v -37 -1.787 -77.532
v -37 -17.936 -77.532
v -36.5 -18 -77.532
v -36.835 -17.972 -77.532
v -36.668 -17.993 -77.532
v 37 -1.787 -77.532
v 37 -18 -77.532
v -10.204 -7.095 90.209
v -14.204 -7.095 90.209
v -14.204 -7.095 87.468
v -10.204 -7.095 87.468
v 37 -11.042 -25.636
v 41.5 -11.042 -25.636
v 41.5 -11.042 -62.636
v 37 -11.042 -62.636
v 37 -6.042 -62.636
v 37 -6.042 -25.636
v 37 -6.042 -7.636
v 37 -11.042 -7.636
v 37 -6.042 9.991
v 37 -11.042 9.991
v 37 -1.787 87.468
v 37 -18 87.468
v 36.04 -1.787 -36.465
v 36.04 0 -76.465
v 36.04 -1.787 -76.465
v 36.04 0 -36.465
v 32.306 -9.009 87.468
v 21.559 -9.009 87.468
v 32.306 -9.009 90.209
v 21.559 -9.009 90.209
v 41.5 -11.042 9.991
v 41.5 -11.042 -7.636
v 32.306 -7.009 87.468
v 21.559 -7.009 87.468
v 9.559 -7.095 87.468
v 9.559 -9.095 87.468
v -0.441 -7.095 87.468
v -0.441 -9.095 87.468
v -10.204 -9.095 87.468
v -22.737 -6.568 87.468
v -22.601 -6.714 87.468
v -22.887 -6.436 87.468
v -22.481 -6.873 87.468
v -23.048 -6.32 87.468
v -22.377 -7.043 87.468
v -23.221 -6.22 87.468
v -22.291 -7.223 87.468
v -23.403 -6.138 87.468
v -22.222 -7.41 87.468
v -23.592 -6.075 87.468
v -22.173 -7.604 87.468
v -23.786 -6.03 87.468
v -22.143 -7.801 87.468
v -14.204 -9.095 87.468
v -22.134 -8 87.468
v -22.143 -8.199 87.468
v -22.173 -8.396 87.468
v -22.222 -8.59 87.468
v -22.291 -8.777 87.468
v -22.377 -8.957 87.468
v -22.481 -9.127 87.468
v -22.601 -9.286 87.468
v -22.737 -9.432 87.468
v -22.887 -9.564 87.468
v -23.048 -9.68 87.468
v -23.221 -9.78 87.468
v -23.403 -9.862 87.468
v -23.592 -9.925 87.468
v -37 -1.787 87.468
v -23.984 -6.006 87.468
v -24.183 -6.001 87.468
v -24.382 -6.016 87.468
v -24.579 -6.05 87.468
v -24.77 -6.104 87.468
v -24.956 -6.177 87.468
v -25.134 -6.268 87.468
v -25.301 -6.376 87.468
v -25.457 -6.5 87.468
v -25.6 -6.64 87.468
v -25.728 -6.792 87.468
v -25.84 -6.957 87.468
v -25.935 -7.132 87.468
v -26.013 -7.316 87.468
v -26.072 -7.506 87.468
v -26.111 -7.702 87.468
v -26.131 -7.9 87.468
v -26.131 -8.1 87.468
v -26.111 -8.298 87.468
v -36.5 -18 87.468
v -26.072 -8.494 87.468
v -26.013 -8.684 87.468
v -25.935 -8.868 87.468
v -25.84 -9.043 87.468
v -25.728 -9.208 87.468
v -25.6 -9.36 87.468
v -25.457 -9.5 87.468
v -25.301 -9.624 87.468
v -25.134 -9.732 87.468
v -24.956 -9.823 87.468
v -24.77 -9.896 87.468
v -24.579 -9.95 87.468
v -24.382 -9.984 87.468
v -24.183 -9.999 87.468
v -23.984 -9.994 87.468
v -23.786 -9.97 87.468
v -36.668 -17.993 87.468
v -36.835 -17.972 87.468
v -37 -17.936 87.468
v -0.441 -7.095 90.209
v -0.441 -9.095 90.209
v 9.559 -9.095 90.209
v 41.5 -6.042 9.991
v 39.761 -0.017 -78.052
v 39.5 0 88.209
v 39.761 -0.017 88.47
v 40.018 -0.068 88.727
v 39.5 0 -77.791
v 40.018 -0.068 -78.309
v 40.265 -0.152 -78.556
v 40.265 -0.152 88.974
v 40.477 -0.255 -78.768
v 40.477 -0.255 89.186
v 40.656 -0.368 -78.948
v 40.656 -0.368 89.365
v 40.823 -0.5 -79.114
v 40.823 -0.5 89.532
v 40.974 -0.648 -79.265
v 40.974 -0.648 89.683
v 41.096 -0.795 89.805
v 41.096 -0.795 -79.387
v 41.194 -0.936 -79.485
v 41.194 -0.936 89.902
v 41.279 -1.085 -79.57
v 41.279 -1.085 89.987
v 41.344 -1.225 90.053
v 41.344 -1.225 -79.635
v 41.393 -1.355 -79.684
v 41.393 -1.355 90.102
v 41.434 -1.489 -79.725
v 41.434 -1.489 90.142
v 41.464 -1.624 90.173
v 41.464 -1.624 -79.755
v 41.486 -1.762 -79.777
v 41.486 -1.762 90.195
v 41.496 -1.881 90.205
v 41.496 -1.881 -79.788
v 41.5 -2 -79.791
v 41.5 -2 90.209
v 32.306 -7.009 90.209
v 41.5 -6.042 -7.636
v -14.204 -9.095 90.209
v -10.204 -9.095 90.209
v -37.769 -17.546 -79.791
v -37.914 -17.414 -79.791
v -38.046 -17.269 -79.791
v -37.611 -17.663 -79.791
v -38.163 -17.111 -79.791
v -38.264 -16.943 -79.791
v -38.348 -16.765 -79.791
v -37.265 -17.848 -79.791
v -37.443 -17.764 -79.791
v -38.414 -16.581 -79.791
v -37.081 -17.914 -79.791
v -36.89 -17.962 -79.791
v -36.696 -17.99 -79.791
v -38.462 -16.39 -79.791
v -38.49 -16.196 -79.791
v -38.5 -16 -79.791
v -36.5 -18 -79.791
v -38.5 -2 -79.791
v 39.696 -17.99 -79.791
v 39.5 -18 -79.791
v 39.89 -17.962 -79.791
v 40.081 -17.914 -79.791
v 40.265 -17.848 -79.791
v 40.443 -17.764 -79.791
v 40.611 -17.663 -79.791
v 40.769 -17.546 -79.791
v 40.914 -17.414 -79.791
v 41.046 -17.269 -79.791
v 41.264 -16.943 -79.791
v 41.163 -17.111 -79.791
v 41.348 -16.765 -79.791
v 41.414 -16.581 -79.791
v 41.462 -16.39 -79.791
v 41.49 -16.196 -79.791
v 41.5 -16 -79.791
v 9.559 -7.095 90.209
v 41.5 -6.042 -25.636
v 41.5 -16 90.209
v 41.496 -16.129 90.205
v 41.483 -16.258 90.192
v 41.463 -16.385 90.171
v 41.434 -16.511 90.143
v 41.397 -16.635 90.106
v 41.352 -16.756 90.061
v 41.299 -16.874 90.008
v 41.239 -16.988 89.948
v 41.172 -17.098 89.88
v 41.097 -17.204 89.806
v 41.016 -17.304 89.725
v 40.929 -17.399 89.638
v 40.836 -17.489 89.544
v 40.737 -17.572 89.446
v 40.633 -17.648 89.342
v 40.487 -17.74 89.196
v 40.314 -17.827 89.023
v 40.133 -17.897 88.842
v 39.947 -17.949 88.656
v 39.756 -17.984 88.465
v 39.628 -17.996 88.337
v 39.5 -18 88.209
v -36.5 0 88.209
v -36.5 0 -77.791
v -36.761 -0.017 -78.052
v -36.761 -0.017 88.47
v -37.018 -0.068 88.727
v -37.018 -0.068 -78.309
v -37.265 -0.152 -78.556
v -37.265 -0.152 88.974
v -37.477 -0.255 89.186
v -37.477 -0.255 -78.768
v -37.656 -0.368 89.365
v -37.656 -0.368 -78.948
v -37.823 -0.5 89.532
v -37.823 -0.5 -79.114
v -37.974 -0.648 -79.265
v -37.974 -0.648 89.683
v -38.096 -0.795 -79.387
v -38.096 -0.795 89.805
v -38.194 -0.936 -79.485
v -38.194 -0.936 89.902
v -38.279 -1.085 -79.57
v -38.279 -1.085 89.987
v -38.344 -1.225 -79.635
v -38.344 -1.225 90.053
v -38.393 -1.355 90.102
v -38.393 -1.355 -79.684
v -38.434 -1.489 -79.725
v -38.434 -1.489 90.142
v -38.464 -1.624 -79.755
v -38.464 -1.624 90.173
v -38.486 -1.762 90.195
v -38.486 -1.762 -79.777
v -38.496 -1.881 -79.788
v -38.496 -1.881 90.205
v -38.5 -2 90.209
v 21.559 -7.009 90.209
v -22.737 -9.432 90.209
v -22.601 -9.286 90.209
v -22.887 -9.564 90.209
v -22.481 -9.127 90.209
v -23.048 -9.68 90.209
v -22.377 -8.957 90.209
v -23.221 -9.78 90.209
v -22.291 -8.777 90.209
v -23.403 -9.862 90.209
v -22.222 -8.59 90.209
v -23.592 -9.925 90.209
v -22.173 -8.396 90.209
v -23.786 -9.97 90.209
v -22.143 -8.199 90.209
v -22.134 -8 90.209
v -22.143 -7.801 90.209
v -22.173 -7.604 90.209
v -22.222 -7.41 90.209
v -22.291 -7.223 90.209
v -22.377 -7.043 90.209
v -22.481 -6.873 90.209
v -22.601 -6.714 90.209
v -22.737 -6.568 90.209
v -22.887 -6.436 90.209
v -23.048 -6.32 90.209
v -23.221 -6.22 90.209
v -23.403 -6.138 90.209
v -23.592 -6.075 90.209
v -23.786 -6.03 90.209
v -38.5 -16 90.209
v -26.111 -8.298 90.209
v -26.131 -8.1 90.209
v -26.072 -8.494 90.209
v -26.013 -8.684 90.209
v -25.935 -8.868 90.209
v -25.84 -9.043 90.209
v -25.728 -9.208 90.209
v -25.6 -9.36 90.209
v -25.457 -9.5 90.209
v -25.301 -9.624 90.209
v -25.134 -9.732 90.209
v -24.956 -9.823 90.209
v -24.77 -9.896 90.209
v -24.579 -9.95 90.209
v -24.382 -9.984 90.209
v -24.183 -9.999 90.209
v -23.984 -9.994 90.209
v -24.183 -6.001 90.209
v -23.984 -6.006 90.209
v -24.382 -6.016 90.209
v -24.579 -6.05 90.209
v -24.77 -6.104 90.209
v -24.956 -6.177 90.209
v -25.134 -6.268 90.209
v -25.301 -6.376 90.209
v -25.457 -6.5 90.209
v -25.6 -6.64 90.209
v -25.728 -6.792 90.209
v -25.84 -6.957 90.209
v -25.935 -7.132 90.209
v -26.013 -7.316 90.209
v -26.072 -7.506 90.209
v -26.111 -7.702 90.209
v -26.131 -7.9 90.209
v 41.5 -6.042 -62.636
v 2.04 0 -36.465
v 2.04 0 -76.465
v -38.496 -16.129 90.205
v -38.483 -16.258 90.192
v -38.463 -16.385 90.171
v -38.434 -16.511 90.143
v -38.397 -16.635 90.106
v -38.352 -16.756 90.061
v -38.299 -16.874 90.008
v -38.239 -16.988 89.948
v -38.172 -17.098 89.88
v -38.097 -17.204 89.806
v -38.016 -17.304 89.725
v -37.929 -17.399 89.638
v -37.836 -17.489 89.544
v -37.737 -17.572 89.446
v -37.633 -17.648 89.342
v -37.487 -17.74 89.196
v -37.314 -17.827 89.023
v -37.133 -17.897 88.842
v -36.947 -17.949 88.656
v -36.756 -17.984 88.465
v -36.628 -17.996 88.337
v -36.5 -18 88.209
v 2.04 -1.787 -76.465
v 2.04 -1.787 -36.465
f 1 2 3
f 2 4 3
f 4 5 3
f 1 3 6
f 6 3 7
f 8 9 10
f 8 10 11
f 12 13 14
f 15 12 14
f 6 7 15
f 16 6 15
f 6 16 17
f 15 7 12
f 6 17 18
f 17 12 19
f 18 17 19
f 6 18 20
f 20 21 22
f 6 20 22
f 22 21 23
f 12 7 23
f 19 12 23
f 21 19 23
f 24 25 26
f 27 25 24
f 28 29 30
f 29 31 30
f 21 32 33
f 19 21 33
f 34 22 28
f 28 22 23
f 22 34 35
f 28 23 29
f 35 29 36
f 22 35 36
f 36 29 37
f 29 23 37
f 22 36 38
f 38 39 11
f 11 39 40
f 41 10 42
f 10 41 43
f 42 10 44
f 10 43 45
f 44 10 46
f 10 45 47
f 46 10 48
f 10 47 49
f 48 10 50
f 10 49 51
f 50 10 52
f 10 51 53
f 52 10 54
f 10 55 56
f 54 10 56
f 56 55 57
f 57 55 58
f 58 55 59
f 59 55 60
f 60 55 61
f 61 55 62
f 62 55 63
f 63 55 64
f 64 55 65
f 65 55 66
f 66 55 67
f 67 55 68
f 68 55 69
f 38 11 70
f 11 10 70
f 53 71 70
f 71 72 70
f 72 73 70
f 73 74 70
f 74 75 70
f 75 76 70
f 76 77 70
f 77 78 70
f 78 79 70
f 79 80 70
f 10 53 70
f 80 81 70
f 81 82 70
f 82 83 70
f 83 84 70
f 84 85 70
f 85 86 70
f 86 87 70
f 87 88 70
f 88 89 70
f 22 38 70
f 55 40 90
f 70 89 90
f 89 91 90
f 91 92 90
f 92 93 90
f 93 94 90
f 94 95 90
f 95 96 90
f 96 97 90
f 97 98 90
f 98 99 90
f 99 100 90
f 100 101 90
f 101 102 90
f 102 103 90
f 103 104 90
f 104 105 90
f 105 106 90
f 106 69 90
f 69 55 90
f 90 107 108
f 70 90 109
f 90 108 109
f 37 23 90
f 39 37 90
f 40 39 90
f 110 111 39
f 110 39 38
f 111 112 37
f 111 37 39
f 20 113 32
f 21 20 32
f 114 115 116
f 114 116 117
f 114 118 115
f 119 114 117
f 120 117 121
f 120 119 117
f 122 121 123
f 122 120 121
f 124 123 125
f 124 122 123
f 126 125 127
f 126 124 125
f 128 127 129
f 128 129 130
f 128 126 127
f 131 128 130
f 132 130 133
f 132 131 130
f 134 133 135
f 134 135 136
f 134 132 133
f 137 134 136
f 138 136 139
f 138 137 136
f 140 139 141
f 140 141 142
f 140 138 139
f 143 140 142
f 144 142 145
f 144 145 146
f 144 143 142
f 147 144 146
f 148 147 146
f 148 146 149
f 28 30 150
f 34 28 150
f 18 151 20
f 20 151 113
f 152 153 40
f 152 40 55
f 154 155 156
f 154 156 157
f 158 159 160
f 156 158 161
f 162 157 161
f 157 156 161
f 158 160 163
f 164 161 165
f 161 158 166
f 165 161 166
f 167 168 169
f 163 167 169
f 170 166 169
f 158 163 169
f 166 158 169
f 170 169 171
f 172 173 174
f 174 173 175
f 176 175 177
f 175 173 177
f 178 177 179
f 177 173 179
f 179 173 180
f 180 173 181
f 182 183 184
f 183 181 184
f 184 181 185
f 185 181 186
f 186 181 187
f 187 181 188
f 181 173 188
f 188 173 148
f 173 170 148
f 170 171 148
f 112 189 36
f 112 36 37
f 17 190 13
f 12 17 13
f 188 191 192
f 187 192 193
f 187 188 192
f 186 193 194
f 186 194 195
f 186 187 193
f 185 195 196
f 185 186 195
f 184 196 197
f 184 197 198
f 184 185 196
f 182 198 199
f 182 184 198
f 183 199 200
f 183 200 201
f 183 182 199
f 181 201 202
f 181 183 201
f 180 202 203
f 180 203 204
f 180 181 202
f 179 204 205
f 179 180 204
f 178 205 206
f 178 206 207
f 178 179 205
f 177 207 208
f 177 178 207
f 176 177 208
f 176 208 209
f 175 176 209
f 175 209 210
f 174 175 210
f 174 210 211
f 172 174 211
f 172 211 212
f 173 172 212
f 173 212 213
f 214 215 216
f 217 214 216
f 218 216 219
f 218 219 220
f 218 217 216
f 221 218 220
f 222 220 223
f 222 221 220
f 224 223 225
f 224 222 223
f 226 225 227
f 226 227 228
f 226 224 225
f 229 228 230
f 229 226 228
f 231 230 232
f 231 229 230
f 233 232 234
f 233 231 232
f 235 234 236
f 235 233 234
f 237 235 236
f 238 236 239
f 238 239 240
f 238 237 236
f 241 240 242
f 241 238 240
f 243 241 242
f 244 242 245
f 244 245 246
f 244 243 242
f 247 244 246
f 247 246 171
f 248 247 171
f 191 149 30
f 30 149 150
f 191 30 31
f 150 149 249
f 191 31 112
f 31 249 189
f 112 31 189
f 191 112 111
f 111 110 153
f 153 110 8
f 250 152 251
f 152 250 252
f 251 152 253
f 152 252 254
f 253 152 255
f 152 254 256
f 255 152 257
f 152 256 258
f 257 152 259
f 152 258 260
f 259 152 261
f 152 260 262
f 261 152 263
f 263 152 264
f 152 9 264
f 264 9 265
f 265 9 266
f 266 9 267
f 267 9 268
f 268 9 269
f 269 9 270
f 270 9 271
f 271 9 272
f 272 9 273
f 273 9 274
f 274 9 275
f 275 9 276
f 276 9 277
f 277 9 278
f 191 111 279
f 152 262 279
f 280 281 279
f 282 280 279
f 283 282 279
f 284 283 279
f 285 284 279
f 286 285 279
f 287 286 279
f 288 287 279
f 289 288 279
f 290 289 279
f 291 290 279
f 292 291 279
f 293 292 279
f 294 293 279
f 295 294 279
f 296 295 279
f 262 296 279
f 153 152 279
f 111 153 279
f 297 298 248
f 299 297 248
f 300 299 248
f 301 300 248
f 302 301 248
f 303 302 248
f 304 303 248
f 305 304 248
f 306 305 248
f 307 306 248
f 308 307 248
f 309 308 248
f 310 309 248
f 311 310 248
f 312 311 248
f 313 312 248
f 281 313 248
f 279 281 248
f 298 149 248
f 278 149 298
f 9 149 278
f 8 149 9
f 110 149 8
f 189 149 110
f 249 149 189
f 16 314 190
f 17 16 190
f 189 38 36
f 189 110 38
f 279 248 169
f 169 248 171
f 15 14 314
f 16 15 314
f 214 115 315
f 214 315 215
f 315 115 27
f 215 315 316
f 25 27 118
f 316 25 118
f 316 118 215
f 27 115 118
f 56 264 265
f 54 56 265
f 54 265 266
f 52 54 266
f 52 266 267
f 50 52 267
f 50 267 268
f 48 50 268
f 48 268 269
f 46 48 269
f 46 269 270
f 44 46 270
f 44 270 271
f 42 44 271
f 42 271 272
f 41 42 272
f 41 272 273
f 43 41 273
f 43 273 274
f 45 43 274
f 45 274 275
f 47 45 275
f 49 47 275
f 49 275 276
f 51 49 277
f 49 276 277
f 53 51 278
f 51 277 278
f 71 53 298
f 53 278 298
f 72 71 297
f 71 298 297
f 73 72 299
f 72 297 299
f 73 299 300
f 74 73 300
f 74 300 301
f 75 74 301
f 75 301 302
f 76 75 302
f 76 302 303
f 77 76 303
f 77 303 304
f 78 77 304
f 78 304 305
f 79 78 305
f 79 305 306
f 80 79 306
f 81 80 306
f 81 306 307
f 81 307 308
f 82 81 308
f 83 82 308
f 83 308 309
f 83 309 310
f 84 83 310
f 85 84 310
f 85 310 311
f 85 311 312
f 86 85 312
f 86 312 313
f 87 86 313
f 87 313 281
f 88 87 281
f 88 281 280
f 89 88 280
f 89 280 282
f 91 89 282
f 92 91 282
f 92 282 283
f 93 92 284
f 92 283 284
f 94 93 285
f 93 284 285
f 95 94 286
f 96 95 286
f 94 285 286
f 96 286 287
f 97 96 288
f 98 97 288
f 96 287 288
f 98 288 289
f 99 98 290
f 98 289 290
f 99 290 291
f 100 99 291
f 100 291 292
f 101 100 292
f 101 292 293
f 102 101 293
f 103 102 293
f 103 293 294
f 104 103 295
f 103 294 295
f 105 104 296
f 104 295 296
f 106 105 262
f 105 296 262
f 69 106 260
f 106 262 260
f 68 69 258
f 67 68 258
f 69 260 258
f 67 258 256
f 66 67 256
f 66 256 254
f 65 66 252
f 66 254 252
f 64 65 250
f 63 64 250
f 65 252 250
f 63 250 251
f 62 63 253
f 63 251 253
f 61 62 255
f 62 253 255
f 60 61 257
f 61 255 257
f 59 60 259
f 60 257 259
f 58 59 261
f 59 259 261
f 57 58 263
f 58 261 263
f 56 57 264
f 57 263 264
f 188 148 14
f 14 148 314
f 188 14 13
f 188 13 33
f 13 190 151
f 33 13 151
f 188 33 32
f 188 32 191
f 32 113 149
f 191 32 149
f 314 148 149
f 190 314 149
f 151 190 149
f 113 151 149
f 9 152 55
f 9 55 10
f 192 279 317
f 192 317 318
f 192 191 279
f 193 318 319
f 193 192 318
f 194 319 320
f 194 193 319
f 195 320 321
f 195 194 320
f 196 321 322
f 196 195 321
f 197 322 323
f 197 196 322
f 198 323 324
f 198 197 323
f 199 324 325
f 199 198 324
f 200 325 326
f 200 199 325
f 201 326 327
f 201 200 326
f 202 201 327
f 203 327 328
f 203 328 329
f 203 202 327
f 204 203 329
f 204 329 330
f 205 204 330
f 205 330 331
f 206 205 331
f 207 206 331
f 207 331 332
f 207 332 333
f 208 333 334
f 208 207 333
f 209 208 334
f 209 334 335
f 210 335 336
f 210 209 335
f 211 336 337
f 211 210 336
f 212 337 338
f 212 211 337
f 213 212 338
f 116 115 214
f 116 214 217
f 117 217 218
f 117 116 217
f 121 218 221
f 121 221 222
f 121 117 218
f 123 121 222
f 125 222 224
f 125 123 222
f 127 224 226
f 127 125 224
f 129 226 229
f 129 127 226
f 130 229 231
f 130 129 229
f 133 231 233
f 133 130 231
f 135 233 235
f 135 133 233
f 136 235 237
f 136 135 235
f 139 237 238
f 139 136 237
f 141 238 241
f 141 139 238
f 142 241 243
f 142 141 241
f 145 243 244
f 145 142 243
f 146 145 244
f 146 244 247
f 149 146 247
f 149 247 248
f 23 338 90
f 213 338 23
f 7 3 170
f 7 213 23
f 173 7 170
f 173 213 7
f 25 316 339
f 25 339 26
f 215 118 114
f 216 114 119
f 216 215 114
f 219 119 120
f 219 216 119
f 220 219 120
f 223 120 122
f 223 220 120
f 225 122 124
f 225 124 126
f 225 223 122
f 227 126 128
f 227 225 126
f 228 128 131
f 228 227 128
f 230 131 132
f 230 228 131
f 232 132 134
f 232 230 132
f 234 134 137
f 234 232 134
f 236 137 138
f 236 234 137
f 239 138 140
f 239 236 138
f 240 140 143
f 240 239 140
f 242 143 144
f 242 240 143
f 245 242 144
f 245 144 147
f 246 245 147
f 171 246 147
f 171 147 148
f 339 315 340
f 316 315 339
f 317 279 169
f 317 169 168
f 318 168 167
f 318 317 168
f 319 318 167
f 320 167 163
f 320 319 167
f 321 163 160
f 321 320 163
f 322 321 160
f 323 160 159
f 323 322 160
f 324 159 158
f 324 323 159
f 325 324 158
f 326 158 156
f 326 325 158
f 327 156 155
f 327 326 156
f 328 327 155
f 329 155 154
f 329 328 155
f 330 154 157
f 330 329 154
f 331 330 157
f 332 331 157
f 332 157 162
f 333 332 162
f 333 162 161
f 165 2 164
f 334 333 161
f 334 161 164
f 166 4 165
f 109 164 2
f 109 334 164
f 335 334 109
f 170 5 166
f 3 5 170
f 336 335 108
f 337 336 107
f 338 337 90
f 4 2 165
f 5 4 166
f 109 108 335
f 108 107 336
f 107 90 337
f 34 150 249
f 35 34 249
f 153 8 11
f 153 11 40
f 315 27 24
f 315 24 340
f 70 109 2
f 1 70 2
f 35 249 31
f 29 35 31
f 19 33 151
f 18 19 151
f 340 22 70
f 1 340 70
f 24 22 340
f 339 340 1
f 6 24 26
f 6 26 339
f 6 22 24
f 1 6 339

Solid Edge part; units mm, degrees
sketch "Sketch1" plane through (0, 0, 0) normal (0, -1, 0) x (1, 0, 0)
  line L0 (-38.5, 90.2089) -> (-38.5, -79.7911)
  line L1 (-38.5, -79.7911) -> (41.5, -79.7911)
  line L2 (41.5, -79.7911) -> (41.5, 90.2089)
  line L3 (41.5, 90.2089) -> (-38.5, 90.2089)
extrude "Protrusion1" add sketch "Sketch1" along normal blind 18
sketch "Sketch2" plane through (1.5, -18, 5.2089) normal (0, -1, 0) x (1, 0, 0)
  line L0 (35.5, -82.7405) -> (35.5, 82.2595)
  line L1 (35.5, 82.2595) -> (-38.5, 82.2595)
  line L2 (-38.5, 82.2595) -> (-38.5, -82.7405)
  line L3 (-38.5, -82.7405) -> (35.5, -82.7405)
extrude "ExtrudedCutout_1" cut sketch "Sketch2" against normal blind 16.2133
sketch "Sketch3" plane through (1.5, 0, 5.2089) normal (0, 1, 0) x (0, 0, 1)
  line L0 (-81.6739, 0.5403) -> (-81.6739, 34.5403)
  line L1 (-81.6739, 34.5403) -> (-41.6739, 34.5403)
  line L2 (-41.6739, 34.5403) -> (-41.6739, 0.5403)
  line L3 (-41.6739, 0.5403) -> (-81.6739, 0.5403)
extrude "Cutout1" cut sketch "Sketch3" against normal up to next
fillet "Round_1" radius 2 7 edges at (-38.5, -18, 5.2089) (41.5, -18, 5.2089) (1.5, 0, -79.7911) (1.5, -18, 90.2089) (41.5, 0, 5.2089) (-38.5, 0, 5.2089) (1.5, 0, 90.2089)
sketch "Sketch4" plane through (41.5, -9, 5.2089) normal (1, 0, 0) x (0, 0, -1)
  line L0 (67.8445, -2.0423) -> (67.8445, 2.9577)
  line L1 (67.8445, 2.9577) -> (30.8445, 2.9577)
  line L2 (30.8445, 2.9577) -> (30.8445, -2.0423)
  line L3 (30.8445, -2.0423) -> (67.8445, -2.0423)
extrude "Cutout2" cut sketch "Sketch4" against normal up to next
sketch "Sketch5" plane through (41.5, -9, 5.2089) normal (1, 0, 0) x (0, 0, -1)
  line L0 (-4.7818, 2.9577) -> (-4.7818, -2.0423)
  line L1 (-4.7818, -2.0423) -> (12.8445, -2.0423)
  line L2 (12.8445, -2.0423) -> (12.8445, 2.9577)
  line L3 (12.8445, 2.9577) -> (-4.7818, 2.9577)
extrude "Cutout3" cut sketch "Sketch5" against normal up to next
sketch "Sketch6" plane through (1.5, -9, 90.2089) normal (0, 0, 1) x (1, 0, 0)
  circle A0 centre (-25.6335, 1) radius 2
extrude "Cutout4" cut sketch "Sketch6" along normal up to next and the other way up to next
sketch "Sketch7" plane through (-14.2035, -9.0953, 90.2089) normal (0, 0, 1) x (1, 0, 0)
  line L0 (0, 2) -> (4, 2)
  line L1 (4, 2) -> (4, 0)
  line L2 (4, 0) -> (0, 0)
  line L3 (0, 0) -> (0, 2)
extrude "Cutout5" cut sketch "Sketch7" against normal up to next
sketch "Sketch8" plane through (1.5, -9, 90.2089) normal (0, 0, 1) x (1, 0, 0)
  line L0 (-1.9412, -0.0953) -> (-1.9412, 1.9047)
  line L1 (-1.9412, 1.9047) -> (8.0588, 1.9047)
  line L2 (8.0588, 1.9047) -> (8.0588, -0.0953)
  line L3 (8.0588, -0.0953) -> (-1.9412, -0.0953)
extrude "Cutout6" cut sketch "Sketch8" against normal up to next
sketch "Sketch9" plane through (1.5, -9, 90.2089) normal (0, 0, 1) x (1, 0, 0)
  line L0 (20.0588, 1.9909) -> (20.0588, -0.0091)
  line L1 (20.0588, -0.0091) -> (30.8058, -0.0091)
  line L2 (30.8058, -0.0091) -> (30.8058, 1.9909)
  line L3 (30.8058, 1.9909) -> (20.0588, 1.9909)
extrude "Cutout7" cut sketch "Sketch9" against normal up to next
